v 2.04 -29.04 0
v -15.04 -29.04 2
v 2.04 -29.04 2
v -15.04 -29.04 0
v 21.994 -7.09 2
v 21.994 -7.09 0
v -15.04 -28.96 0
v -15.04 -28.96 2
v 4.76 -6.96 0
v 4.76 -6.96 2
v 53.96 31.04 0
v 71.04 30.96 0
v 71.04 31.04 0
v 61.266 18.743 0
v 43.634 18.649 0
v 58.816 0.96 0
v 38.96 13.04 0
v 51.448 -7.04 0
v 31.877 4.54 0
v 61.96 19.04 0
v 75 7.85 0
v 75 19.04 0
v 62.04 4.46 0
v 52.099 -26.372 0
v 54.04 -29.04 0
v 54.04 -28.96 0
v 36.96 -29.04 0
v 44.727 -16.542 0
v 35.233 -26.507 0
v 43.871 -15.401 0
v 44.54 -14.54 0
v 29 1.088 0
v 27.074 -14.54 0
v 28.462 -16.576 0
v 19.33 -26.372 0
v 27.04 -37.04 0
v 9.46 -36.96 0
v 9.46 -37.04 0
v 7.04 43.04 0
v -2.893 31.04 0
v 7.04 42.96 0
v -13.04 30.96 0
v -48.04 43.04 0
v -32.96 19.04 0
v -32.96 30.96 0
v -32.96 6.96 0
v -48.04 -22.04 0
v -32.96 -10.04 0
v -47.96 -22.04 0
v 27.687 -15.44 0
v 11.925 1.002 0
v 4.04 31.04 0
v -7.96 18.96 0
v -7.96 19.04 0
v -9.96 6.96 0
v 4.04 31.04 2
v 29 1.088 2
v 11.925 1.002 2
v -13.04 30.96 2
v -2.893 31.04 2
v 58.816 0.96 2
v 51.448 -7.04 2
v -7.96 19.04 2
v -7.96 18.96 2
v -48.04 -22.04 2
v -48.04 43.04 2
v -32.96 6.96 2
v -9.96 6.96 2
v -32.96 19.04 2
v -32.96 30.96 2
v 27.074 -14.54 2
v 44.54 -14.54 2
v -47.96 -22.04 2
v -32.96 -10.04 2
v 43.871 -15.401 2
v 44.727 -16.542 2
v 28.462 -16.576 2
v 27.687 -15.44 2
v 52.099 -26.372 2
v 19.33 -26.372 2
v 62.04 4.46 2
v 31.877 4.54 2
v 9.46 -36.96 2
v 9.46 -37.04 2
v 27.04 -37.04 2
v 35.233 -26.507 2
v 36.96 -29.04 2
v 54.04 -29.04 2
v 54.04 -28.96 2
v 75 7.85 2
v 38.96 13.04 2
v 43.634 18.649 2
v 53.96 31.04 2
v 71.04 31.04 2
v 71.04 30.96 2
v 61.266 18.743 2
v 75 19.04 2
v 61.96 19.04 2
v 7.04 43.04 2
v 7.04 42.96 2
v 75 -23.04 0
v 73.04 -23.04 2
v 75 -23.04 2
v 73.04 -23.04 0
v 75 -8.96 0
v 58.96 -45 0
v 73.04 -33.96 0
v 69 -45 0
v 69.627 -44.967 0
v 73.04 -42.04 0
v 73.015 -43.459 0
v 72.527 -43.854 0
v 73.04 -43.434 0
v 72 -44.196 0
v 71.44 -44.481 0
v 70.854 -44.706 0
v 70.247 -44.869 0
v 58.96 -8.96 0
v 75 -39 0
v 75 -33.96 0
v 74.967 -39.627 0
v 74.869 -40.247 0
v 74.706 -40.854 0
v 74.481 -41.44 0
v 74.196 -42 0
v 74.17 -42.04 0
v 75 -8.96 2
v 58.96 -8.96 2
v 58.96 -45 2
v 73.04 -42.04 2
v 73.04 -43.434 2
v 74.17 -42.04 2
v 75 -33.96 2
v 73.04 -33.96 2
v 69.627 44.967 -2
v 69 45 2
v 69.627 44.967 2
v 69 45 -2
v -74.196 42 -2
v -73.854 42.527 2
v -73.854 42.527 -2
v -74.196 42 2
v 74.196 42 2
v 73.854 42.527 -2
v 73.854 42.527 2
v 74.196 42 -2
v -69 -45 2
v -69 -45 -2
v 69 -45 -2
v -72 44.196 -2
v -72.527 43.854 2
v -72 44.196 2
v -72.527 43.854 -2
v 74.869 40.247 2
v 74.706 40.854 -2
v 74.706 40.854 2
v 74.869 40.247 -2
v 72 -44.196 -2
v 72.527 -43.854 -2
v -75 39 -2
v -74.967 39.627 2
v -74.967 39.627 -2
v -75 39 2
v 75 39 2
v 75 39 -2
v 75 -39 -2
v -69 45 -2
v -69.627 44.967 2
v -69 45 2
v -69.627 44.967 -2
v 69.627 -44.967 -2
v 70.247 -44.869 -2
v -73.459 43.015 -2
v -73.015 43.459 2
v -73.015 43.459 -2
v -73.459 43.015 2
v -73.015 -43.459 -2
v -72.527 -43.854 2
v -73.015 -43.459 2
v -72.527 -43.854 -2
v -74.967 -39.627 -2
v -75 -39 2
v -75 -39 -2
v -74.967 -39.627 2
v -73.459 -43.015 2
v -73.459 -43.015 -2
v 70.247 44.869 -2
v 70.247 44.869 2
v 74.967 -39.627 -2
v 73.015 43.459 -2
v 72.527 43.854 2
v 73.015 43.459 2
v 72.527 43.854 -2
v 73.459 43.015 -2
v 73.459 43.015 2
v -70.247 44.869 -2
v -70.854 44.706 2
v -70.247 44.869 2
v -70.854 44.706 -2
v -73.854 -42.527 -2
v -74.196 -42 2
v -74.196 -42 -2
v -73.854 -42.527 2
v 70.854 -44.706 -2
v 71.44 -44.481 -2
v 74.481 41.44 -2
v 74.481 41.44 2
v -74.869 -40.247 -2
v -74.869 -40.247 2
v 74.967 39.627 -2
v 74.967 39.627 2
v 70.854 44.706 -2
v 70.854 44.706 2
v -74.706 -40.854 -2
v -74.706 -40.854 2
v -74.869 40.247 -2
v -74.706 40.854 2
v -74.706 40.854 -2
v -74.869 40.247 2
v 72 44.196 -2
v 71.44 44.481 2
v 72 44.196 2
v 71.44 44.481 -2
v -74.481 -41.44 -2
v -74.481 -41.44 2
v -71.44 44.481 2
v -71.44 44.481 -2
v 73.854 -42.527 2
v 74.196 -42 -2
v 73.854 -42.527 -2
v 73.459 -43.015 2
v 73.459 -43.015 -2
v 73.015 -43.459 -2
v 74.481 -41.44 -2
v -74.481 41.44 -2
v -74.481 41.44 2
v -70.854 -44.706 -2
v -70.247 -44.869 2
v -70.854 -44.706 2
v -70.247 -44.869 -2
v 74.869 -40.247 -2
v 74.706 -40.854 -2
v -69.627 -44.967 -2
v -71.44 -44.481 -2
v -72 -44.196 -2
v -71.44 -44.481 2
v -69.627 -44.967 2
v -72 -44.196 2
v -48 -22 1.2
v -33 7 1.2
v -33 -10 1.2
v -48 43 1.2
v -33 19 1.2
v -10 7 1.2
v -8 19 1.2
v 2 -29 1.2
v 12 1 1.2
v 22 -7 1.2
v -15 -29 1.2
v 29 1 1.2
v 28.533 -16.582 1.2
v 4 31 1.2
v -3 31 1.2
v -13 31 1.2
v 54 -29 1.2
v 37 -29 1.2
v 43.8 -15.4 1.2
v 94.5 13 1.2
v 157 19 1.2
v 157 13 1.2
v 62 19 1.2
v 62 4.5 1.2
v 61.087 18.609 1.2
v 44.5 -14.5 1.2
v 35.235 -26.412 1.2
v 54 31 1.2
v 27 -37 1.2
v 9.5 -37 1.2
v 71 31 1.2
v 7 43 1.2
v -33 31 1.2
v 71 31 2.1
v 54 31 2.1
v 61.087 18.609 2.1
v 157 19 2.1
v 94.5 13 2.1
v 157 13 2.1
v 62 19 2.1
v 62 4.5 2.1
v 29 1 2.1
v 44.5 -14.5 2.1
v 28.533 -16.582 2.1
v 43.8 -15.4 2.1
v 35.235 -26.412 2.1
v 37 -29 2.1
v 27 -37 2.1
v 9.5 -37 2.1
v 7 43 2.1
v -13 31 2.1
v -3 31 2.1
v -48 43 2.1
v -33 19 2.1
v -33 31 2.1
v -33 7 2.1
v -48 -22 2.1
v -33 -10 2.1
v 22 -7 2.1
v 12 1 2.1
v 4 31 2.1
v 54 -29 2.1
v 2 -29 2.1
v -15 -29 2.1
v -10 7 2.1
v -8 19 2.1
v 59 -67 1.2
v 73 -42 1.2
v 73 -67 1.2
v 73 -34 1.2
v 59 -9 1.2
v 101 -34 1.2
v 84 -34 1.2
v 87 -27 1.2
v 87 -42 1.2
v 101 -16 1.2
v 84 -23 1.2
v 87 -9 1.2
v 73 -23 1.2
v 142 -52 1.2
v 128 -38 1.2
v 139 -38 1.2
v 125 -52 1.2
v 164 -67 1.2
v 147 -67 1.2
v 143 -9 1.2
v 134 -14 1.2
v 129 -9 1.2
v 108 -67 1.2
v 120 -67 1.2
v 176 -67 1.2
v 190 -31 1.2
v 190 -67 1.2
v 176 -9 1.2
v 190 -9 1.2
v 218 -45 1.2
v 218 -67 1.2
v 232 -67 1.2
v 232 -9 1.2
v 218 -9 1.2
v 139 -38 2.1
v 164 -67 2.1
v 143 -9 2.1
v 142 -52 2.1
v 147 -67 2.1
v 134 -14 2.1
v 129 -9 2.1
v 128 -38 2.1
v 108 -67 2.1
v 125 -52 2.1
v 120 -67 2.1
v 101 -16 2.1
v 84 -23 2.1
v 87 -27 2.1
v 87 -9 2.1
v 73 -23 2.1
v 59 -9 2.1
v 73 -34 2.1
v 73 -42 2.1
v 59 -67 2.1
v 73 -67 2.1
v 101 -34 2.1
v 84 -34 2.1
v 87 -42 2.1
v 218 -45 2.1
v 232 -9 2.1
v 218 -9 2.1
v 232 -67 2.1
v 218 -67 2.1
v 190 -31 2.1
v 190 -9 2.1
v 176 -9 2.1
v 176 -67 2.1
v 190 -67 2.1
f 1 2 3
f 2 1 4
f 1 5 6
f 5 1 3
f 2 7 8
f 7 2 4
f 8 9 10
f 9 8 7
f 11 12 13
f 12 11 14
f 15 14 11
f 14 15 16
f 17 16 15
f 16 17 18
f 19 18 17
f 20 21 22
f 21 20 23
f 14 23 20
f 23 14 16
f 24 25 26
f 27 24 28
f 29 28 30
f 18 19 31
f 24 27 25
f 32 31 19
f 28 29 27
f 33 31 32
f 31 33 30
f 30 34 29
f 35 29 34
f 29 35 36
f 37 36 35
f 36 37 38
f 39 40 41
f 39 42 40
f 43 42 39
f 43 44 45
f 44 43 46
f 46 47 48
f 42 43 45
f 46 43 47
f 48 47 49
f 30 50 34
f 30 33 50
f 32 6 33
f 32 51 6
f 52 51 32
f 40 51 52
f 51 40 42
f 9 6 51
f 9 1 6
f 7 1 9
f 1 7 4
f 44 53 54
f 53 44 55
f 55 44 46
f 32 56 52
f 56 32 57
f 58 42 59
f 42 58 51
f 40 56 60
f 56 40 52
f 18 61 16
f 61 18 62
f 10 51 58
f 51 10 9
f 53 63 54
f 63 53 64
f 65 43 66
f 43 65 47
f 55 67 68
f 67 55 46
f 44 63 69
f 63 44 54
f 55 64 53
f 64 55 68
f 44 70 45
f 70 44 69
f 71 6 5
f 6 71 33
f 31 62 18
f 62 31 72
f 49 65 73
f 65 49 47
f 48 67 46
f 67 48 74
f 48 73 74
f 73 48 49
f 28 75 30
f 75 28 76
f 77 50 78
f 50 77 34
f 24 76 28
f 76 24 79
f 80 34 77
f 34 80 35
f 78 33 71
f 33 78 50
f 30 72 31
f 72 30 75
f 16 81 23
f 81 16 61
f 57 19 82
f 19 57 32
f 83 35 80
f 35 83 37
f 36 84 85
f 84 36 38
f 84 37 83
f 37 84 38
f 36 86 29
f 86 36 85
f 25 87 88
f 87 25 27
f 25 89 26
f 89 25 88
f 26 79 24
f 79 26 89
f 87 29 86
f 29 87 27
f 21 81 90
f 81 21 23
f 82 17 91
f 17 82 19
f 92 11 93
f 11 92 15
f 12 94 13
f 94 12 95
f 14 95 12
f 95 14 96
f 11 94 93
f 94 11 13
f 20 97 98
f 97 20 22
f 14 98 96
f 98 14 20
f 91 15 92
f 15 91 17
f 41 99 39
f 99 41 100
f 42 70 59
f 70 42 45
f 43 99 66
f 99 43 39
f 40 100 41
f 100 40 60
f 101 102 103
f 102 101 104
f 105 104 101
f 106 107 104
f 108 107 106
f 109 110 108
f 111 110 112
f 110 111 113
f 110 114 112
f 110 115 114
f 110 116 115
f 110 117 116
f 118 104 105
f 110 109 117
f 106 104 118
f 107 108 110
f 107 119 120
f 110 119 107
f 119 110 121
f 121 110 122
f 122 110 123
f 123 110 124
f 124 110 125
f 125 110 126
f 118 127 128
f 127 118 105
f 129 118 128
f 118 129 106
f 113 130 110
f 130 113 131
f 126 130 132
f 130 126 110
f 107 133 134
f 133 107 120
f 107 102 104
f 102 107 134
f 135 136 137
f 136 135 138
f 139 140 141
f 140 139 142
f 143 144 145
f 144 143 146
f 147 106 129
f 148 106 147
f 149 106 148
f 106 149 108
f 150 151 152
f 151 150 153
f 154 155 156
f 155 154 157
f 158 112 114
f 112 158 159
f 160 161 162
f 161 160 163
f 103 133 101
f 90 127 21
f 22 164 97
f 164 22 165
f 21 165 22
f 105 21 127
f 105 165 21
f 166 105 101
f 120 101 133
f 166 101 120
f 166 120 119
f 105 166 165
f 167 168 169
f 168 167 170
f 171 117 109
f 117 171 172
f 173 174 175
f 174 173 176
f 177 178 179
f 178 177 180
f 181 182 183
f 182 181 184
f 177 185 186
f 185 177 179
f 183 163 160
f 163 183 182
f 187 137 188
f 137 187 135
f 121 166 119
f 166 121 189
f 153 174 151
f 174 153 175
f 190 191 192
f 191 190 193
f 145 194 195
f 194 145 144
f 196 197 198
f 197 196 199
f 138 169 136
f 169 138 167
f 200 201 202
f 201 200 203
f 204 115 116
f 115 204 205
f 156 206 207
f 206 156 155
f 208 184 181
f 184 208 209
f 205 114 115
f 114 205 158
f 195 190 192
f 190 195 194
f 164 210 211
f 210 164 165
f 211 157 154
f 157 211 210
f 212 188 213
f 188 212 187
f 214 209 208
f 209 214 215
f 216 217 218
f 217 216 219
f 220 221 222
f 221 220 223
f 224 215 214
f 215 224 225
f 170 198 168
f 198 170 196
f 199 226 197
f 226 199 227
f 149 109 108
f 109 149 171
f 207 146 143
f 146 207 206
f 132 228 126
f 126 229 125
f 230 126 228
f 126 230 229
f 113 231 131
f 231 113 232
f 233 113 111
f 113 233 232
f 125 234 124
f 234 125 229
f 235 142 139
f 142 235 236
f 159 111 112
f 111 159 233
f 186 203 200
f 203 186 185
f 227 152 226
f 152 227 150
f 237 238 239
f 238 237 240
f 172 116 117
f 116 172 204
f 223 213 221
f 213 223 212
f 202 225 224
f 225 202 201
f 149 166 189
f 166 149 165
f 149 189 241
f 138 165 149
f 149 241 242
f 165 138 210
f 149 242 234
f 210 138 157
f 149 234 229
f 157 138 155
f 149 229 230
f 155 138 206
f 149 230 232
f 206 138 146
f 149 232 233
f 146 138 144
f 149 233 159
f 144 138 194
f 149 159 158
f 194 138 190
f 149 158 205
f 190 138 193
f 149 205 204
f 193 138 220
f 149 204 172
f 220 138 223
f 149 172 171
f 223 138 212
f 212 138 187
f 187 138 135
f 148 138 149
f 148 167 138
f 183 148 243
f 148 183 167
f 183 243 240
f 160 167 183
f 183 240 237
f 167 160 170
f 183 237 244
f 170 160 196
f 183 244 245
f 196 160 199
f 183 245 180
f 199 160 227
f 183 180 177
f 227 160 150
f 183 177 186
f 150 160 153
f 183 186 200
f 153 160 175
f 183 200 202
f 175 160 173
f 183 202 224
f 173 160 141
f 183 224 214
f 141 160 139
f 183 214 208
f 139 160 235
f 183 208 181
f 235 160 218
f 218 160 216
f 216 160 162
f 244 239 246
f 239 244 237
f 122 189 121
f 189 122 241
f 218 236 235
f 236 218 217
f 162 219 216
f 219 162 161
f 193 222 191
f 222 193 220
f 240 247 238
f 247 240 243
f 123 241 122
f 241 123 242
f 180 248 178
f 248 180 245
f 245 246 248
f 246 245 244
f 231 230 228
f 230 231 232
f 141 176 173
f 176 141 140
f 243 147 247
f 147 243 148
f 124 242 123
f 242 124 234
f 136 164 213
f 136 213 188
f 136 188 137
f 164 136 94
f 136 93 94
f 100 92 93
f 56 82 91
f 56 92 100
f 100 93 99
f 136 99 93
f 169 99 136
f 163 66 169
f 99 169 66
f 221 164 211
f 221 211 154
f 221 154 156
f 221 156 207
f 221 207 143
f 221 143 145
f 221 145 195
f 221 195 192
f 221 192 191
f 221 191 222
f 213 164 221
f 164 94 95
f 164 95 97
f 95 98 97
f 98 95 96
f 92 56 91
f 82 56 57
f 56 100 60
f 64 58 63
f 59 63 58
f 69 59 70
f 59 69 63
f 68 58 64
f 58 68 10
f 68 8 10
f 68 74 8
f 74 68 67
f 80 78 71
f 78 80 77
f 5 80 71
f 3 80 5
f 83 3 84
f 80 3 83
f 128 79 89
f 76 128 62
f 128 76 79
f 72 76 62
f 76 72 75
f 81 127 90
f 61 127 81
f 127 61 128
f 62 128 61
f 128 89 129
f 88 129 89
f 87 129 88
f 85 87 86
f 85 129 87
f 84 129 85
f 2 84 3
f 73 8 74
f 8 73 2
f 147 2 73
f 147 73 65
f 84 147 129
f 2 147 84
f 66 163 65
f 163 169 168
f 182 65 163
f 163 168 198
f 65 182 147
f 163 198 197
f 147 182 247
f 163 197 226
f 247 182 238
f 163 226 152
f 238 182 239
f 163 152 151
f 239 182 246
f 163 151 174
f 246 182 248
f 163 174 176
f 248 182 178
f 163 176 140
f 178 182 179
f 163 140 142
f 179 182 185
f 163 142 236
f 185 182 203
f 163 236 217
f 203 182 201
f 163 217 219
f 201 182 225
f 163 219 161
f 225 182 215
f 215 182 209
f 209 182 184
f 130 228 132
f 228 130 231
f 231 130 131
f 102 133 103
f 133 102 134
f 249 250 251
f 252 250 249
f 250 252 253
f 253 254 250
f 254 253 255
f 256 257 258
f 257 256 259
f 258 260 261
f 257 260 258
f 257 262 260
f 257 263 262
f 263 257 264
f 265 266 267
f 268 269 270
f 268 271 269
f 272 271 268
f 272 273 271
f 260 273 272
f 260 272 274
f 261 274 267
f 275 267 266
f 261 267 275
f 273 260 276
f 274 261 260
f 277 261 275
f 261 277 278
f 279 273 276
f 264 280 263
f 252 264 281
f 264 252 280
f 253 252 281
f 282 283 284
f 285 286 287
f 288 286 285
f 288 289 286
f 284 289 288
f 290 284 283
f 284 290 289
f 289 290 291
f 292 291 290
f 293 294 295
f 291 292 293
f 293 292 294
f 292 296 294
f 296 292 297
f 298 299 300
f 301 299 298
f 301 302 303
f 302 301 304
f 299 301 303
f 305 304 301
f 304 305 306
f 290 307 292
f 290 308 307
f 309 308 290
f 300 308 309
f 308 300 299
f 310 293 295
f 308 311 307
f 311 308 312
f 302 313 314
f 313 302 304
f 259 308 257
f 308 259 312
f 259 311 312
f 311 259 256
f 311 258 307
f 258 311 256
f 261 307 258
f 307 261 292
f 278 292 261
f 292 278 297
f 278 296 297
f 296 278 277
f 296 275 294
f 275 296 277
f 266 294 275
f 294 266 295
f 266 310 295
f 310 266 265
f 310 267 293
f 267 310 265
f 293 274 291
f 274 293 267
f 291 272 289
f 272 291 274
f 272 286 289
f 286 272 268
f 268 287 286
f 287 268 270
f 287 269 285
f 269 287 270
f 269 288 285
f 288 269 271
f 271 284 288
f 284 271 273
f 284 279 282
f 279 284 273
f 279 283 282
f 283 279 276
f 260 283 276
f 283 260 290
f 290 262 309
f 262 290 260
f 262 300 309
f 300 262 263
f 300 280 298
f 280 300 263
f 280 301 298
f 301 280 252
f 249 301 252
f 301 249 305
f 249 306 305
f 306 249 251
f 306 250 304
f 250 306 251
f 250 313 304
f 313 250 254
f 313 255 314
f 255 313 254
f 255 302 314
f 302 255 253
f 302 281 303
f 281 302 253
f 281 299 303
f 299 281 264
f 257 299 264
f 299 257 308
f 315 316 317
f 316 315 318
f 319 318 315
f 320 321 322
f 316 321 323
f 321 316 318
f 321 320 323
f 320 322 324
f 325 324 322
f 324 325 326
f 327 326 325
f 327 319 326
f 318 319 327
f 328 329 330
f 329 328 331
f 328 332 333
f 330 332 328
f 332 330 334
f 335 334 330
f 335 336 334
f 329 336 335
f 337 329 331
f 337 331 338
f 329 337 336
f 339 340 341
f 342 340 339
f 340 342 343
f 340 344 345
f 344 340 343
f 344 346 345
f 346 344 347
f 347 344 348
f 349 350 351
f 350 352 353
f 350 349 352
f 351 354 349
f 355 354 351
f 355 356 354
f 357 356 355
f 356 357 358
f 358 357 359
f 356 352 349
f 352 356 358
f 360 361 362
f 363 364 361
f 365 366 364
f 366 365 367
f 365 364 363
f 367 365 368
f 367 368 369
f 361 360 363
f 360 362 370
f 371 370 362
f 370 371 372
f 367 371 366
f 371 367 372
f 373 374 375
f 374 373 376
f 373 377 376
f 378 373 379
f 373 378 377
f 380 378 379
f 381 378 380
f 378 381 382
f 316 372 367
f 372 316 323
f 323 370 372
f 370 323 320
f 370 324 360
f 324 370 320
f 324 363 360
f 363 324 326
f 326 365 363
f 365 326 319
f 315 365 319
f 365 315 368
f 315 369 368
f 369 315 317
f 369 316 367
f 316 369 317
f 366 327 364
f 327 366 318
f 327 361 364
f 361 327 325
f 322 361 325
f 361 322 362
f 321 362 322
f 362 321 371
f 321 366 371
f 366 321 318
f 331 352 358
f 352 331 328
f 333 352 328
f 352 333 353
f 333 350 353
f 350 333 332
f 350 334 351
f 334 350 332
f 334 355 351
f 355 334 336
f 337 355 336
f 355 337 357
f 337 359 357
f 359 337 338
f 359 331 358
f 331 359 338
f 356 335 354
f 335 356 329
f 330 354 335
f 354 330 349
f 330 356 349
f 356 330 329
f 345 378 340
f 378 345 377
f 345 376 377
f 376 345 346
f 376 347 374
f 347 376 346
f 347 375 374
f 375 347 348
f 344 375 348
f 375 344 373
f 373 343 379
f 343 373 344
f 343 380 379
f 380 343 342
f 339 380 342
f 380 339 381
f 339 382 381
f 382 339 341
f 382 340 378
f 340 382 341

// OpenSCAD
// ===================================================================
// FXPAN MULTI-SENSOR HARDWARE FACEPLATE ASSEMBLY (3D MANIFOLD MESH)
// ===================================================================

$fn = 60; // Smooths out all curved boundaries and fillets

// --- GLOBAL CALIBRATION METRICS (In Millimeters) ---
PLATE_W = 150.0; // Total chassis face width
PLATE_H = 90.0; // Total chassis face height
PLATE_T = 4.0; // Thickness of structural plate shell
EMBOSS_D = 0.8; // Depth of color insertion (exactly 4 layers at 0.2mm layer height)
CLEARANCE = 0.04; // Zero-tolerance precision air gap clearance for multi-material slicing

// --- PRE-ALIGNED VIEWPORT RENDER SELECTION ---
// Change these booleans to isolate individual parts for exporting to STL files
render_chassis_base = true;
render_gold_inlay = true;
render_white_inlay = true;

// ===================================================================
// PRIMARY RENDERING LOOP CONTROL BUILDER
// ===================================================================
union() {
if (render_chassis_base) {
color("DimGray") chassis_with_pockets();
}
if (render_gold_inlay) {
color("Gold") translate([0, 0, (PLATE_T/2) - EMBOSS_D]) logo_gold_segments();
}
if (render_white_inlay) {
color("White") translate([0, 0, (PLATE_T/2) - EMBOSS_D]) logo_white_segments();
}
}

// ===================================================================
// METRIC BUILD MODULES (MODULE DEFINITIONS)
// ===================================================================

// Master structural plate with a clean boolean cut out for the logo inserts
module chassis_with_pockets() {
difference() {
// Core structural backing plate matching the rounded style of the D800 body prism
linear_extrude(height = PLATE_T, center = true) {
minkowski() {
square([PLATE_W - 12, PLATE_H - 12], center = true);
circle(r = 6);
}
}

// Subtracts the expanded paths to make clean structural alignment slots
translate([0, 0, (PLATE_T/2) - EMBOSS_D]) {
minkowski() {
union() {
logo_gold_segments();
logo_white_segments();
}
// Creates an air-gap safety expansion block
cube([CLEARANCE * 2, CLEARANCE * 2, EMBOSS_D * 3], center = true);
}
}
}
}

// Extrudes the FX frame, interlocking X, and flowing baseline swoops
module logo_gold_segments() {
linear_extrude(height = EMBOSS_D + 0.1) {
translate([-48, -12, 0]) { // Zero-Origin alignment offset
// Part A: The FX Container Frame Bracket
polygon(points=[[0,55],[55,55],[45,43],[15,43],[15,31],[40,31],[38,19],[15,19],[15,2],[0,-10]]);

// Part B: The Sharp Interlocking X Assembly
polygon(points=[[35,43],[52,43],[77,13],[102,43],[119,43],[87,3],[102,-17],[85,-17],[70,5],[50,-17],[33,-17],[60,13]]);

// Part C: The Sweeping Underline Tail (Polygonal Bezier Approximation)
polygon(points=[
[82.5,9.5],[92.5,23.5],[110,31],[205,31],[205,25],[142.5,25],[110,16.5],[92.5,-2.5],
[75,-25],[57.5,-25],[85,4.5],[82.5,9.5]
]);
}
}
}

// Extrudes the custom wide-tracked P, A, and N typographic geometries
module logo_white_segments() {
linear_extrude(height = EMBOSS_D + 0.1) {
translate([-48, -12, 0]) {
// LETTER 'P' (With internal window cutout punched out)
difference() {
polygon(points=[[107,3],[135,3],[149,-4],[149,-22],[135,-30],[121,-30],[121,-55],[107,-55]]);
polygon(points=[[121,-11],[132,-11],[135,-15],[132,-22],[121,-22]]);
}

// LETTER 'A' (With structural bridge arch punched out)
difference() {
polygon(points=[[156,-55],[177,3],[191,3],[212,-55],[195,-55],[190,-40],[173,-40],[168,-55]]);
polygon(points=[[176,-26],[187,-26],[182,-2]]);
}

// LETTER 'N'
polygon(points=[[224,-55],[224,3],[238,3],[266,-33],[266,3],[280,3],[280,-55],[266,-55],[238,-19],[238,-55]]);
}
}
}
